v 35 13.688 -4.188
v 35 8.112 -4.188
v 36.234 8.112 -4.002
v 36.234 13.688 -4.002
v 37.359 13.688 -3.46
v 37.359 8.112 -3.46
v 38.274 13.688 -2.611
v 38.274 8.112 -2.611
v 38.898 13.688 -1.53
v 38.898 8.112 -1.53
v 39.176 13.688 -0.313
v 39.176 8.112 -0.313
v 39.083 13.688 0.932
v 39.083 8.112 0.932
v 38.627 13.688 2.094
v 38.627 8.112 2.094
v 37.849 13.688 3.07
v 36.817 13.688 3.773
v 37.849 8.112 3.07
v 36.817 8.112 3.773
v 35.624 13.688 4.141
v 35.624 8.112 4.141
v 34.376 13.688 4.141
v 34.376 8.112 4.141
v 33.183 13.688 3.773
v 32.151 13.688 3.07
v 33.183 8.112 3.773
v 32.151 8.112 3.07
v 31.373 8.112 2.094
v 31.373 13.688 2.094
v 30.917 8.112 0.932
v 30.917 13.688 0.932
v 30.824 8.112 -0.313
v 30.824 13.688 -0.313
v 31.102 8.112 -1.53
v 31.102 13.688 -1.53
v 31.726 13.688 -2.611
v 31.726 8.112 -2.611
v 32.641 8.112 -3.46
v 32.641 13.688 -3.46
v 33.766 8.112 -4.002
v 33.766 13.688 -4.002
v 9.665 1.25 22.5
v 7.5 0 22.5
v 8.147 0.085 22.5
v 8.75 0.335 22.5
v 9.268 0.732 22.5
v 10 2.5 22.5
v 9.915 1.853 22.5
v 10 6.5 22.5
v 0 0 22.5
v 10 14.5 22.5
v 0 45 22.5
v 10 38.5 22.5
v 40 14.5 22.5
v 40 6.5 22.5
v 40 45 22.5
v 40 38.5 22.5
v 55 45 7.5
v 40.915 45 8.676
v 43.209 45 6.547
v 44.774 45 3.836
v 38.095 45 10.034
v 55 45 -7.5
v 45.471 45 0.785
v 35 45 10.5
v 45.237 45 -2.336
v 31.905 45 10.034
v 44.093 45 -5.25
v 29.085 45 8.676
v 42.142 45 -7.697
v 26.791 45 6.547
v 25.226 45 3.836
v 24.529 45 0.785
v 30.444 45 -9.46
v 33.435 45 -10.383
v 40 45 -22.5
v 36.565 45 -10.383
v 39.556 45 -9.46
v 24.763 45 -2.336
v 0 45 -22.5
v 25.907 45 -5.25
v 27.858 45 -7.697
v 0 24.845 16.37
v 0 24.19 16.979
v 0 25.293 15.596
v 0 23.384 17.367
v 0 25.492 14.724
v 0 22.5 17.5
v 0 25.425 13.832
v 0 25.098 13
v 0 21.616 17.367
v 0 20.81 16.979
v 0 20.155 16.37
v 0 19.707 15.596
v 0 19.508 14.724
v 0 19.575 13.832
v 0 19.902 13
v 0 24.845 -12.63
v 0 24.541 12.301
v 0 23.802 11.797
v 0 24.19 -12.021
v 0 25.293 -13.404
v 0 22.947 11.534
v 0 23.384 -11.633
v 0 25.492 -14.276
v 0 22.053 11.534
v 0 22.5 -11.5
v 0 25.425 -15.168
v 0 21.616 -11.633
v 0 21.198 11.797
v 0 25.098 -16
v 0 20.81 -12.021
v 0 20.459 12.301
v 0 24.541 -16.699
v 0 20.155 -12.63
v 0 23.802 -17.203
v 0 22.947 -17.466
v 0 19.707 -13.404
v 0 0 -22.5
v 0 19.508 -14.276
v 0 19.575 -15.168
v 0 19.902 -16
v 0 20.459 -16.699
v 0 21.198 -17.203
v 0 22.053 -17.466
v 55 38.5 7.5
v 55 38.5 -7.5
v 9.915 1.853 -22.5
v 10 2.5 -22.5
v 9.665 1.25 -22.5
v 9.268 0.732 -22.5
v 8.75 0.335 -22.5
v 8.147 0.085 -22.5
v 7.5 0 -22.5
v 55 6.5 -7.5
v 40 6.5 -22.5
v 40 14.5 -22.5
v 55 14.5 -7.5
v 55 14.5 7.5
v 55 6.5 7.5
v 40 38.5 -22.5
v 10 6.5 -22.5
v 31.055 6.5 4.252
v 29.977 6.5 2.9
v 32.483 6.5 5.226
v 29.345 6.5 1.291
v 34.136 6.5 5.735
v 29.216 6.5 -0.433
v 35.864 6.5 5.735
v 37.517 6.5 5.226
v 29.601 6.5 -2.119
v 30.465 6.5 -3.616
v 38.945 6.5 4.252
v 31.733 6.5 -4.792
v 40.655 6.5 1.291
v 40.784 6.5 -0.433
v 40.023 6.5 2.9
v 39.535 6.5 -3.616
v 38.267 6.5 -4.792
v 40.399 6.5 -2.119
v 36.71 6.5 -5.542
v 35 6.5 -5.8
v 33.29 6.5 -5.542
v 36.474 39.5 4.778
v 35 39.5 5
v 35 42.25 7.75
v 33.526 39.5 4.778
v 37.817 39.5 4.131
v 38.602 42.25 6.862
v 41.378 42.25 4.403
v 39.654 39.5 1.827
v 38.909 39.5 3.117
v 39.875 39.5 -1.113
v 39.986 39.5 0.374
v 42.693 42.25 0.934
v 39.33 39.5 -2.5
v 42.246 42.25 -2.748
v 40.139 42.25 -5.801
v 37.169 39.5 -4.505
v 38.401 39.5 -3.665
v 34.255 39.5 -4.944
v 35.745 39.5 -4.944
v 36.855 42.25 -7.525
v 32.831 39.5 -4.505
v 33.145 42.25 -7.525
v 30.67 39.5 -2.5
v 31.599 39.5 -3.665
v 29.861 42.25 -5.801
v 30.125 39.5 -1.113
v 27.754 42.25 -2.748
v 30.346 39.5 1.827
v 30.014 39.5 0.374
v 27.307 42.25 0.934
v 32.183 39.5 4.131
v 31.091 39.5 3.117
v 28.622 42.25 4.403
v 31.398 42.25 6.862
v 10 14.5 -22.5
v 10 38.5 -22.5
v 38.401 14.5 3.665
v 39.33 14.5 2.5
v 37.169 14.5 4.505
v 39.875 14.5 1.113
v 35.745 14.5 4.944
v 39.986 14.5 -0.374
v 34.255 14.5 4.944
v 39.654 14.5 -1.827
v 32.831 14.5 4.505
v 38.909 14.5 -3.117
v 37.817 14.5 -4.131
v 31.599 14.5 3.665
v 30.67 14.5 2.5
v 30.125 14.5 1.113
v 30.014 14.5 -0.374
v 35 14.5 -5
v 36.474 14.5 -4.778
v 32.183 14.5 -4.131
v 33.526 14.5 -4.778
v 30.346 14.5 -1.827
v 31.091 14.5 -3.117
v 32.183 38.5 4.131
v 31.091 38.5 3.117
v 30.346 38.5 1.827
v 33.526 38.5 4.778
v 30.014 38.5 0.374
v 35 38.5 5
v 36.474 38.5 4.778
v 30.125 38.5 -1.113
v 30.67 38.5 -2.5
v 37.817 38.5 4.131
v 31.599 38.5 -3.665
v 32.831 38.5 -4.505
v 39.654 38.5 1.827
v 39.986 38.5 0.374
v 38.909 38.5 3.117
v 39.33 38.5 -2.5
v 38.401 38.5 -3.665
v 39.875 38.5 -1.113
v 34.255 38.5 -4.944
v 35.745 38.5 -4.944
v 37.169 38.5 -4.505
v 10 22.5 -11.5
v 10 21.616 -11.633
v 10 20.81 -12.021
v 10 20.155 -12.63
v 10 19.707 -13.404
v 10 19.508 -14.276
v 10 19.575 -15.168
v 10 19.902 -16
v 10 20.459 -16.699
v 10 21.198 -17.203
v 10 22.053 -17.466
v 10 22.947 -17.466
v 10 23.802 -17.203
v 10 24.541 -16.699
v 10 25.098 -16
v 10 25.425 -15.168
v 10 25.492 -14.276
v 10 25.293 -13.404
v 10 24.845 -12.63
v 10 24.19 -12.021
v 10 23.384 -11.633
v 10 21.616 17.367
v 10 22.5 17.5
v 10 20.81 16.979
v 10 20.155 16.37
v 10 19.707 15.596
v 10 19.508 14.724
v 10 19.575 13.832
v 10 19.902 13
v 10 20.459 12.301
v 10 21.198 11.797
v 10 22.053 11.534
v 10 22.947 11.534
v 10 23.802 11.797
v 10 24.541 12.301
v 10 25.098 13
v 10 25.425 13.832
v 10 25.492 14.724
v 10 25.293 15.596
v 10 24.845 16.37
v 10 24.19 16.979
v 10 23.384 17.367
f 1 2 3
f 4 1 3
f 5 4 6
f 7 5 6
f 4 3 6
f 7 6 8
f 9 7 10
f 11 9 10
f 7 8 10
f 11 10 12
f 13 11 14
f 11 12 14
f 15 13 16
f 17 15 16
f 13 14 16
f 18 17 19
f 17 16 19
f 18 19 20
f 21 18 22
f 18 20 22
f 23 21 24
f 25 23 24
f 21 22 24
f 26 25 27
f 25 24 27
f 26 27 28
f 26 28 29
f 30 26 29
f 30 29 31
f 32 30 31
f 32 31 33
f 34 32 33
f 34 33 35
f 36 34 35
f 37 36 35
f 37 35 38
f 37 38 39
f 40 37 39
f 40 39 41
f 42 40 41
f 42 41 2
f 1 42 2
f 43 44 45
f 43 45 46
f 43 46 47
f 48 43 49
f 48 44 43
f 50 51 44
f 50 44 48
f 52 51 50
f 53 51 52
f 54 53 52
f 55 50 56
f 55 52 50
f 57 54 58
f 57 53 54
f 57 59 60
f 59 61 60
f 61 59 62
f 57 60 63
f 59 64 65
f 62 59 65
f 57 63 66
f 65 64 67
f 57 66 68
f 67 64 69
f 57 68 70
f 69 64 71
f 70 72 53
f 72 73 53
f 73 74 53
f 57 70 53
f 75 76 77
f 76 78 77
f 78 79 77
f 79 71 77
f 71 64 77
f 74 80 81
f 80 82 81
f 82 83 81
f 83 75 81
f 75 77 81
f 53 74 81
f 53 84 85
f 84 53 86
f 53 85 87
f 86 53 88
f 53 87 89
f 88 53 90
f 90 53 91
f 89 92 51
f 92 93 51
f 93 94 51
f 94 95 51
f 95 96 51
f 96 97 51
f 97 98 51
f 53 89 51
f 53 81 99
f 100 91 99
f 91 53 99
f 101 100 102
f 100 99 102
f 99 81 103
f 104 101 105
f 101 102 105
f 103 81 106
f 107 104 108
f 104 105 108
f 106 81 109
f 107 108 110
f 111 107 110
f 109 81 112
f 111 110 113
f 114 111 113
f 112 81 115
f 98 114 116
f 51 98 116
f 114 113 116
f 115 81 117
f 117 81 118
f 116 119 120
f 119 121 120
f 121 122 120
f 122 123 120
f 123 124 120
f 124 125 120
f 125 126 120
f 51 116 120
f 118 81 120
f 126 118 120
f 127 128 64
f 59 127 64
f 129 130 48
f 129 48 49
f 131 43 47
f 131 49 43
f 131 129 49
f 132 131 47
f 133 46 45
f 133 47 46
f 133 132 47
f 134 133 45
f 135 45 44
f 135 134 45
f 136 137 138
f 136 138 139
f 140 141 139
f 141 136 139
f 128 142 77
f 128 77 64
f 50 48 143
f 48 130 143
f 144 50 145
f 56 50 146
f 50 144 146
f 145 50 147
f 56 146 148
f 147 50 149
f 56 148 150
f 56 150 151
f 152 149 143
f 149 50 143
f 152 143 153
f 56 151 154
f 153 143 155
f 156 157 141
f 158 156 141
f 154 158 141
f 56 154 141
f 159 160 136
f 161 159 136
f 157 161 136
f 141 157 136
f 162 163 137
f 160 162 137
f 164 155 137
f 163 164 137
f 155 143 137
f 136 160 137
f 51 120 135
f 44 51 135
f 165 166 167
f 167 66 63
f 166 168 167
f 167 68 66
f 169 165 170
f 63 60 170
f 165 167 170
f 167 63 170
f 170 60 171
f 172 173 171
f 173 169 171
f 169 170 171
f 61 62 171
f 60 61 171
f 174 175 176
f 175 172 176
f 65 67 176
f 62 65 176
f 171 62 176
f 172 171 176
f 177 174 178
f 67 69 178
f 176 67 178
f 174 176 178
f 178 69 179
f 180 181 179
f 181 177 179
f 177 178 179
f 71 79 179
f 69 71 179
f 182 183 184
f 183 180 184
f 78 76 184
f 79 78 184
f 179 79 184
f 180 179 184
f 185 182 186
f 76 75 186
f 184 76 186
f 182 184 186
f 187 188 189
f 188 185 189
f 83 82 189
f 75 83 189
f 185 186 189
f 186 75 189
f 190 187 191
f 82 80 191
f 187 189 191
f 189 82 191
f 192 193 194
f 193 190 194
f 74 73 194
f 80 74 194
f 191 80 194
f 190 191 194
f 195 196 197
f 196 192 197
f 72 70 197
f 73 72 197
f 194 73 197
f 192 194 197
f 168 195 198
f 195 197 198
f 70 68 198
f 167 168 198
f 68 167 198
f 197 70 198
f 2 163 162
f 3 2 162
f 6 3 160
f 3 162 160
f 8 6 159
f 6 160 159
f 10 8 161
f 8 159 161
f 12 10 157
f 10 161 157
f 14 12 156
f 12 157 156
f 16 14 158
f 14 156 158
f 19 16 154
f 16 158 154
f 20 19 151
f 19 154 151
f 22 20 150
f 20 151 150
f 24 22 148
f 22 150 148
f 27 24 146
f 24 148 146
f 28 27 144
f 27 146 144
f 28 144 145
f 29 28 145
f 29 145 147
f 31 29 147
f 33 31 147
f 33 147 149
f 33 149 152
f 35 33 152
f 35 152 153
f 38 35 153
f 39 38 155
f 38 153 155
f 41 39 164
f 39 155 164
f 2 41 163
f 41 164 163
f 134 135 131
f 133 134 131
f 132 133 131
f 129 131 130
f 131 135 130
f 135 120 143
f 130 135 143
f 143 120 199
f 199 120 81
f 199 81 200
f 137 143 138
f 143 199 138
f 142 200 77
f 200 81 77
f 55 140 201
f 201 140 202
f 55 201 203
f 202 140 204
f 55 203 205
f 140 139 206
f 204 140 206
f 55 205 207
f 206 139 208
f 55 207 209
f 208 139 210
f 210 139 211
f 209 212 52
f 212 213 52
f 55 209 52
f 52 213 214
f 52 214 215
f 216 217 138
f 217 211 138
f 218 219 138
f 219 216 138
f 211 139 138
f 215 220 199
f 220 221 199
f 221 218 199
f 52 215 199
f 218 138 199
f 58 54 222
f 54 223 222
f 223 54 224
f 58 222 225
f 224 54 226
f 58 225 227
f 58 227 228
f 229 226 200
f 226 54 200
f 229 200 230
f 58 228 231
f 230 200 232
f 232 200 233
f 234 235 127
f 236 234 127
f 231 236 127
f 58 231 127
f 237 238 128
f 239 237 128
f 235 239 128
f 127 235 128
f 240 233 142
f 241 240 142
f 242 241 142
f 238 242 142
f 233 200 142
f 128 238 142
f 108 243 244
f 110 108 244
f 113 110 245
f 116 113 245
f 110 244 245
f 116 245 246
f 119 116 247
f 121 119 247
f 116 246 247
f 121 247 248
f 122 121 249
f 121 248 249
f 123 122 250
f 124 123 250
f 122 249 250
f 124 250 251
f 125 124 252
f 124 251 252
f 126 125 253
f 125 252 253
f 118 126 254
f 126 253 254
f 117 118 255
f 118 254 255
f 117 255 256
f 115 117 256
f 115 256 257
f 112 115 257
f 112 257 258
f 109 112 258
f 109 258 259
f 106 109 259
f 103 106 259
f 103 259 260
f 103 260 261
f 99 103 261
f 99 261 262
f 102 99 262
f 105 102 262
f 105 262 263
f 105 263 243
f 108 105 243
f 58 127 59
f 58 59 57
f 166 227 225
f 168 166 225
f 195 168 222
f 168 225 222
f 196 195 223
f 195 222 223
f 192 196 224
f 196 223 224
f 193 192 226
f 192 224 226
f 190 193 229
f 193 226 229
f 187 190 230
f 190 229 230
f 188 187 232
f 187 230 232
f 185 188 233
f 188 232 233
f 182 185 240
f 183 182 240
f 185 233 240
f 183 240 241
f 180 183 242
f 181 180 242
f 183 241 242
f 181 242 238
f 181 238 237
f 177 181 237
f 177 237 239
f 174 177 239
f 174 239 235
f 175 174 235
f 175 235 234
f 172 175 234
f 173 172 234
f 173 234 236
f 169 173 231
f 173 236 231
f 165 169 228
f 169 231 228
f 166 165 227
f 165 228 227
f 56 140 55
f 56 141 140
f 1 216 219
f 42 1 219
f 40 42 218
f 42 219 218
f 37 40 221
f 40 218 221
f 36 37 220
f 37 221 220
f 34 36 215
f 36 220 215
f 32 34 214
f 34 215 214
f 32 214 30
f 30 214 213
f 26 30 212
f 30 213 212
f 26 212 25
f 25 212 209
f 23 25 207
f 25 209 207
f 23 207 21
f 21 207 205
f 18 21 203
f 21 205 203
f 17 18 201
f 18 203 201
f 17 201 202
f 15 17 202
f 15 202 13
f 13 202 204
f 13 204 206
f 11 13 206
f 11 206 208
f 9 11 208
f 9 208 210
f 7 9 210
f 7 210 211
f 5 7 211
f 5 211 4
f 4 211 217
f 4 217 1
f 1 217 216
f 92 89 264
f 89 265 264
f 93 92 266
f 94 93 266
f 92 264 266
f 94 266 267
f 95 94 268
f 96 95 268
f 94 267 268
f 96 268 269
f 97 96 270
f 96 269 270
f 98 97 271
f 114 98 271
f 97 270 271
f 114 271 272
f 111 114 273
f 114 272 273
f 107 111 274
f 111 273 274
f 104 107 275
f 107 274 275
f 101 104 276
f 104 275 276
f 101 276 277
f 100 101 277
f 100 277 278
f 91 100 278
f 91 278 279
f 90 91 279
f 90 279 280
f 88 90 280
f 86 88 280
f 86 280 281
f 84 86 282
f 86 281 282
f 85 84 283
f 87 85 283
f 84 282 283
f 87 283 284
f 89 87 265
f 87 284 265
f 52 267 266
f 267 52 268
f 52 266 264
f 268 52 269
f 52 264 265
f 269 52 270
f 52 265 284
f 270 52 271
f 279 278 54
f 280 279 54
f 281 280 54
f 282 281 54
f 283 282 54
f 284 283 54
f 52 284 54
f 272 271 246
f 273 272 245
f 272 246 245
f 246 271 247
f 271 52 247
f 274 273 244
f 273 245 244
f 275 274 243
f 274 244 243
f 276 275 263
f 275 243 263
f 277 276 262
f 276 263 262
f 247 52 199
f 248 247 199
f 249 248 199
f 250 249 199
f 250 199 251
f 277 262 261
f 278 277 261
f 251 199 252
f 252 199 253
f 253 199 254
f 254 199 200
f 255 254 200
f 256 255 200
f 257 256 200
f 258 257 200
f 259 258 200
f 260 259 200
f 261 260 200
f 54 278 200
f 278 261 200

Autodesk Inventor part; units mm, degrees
sketch "Sketch_6" plane through (0, 0, 0) normal (0, 0, 1) x (1, 0, 0)
  line L0 (0, 45) -> (0, 0)
  line L1 (0, 0) -> (7.5, 0)
  arc A0 (7.5, 0) -> (10, 2.5) centre (7.5, 2.5) ccw
  line L2 (10, 2.5) -> (10, 6.5)
  line L3 (10, 6.5) -> (55, 6.5)
  line L4 (55, 6.5) -> (55, 14.5)
  line L5 (55, 14.5) -> (10, 14.5)
  line L6 (10, 14.5) -> (10, 38.5)
  line L7 (10, 38.5) -> (55, 38.5)
  line L8 (55, 38.5) -> (55, 45)
  line L9 (55, 45) -> (0, 45)
extrude "Extrusion1" add sketch "Sketch_6" along normal mid plane 45
sketch "Sketch_7" plane through (0, 0, 0) normal (0, 1, 0) x (-1, 0, 0)
  line L0 (-40, 22.5) -> (-110, 22.5)
  line L1 (-110, 22.5) -> (-110, -22.5)
  line L2 (-110, -22.5) -> (-40, -22.5)
  line L3 (-40, -22.5) -> (-55, -7.5)
  line L4 (-55, -7.5) -> (-55, 7.5)
  line L5 (-55, 7.5) -> (-40, 22.5)
extrude "Extrusion2" cut sketch "Sketch_7" along normal blind 45
sketch "Sketch_8" plane through (35, 0, 0) normal (1, 0, 0) x (0, 0, -1)
  line L0 (0, 6.5) -> (0, 14.5)
  line L1 (0, 14.5) -> (5, 14.5)
  line L2 (5, 14.5) -> (4.188, 13.688)
  line L3 (4.188, 13.688) -> (4.188, 8.112)
  line L4 (4.188, 8.112) -> (5.8, 6.5)
  line L5 (5.8, 6.5) -> (0, 6.5)
  line L6 (0, 6.5) -> (0, 14.5)
revolve "Revolution1" cut sketch "Sketch_8" angle 360 about axis through (35, 6.5, 0) along (0, -1, 0)
thread "Thread1" size "M10x1.5" class "6H" standard "ISO Metric profile" full length
sketch "Sketch4" plane through (0, 45, 22.5) normal (0, 1, 0) x (1, 0, 0)
  point P0 (35, 22.5)
hole "Hole1" at (35, 45, 0) direction (0, -1, 0) diameter 10 depth 6.5 countersink diameter 21 countersink angle 90
sketch "Sketch5" plane through (0, 0, 22.5) normal (-1, 0, 0) x (0, 0, 1)
  point P0 (-37, 22.5)
hole "Hole2" at (0, 22.5, -14.5) direction (1, 0, 0) diameter 6 depth 10
sketch "Sketch6" plane through (0, 0, 22.5) normal (-1, 0, 0) x (0, 0, 1)
  point P0 (-8, 22.5)
hole "Hole3" at (0, 22.5, 14.5) direction (1, 0, 0) diameter 6 depth 10
ref_plane "bracket_to_screw_XY" through (35, 45, 0) normal (0, 1, 0) x (1, 0, 0)
ref_plane "bracket_to_screw_YZ" through (35, 45, 0) normal (1, 0, 0) x (0, 0, -1)
ref_plane "bracket_to_screw_ZX" through (35, 45, 0) normal (0, 0, -1) x (0, 1, 0)
ref_plane "screw11_XY" through (10, 22.5, 14.5) normal (1, 0, 0) x (0, 0, -1)
ref_plane "screw11_YZ" through (10, 22.5, 14.5) normal (0, 0, -1) x (0, 1, 0)
ref_plane "screw11_ZX" through (10, 22.5, 14.5) normal (0, 1, 0) x (1, 0, 0)
ref_plane "screw12_XY" through (10, 22.5, -14.5) normal (1, 0, 0) x (0, 0, -1)
ref_plane "screw12_YZ" through (10, 22.5, -14.5) normal (0, 0, -1) x (0, 1, 0)
ref_plane "screw12_ZX" through (10, 22.5, -14.5) normal (0, 1, 0) x (1, 0, 0)
ref_plane "screw1_1_XY" through (-27.6, 22.5, 14.5) normal (-1, 0, 0) x (0, 0, -1)
ref_plane "screw1_1_YZ" through (-27.6, 22.5, 14.5) normal (0, 0, -1) x (0, -1, 0)
ref_plane "screw1_1_ZX" through (-27.6, 22.5, 14.5) normal (0, -1, 0) x (-1, 0, 0)
ref_plane "screw1_2_XY" through (-27.6, 22.5, -14.5) normal (-1, 0, 0) x (0, 0, -1)
ref_plane "screw1_2_YZ" through (-27.6, 22.5, -14.5) normal (0, 0, -1) x (0, -1, 0)
ref_plane "screw1_2_ZX" through (-27.6, 22.5, -14.5) normal (0, -1, 0) x (-1, 0, 0)
ref_plane "screw2_XY" through (10, 22.5, 0) normal (1, 0, 0) x (0, 0, -1)
ref_plane "screw2_YZ" through (10, 22.5, 0) normal (0, 0, -1) x (0, 1, 0)
ref_plane "screw2_ZX" through (10, 22.5, 0) normal (0, 1, 0) x (1, 0, 0)
ref_plane "screw22_XY" through (2.2, 22.5, 0) normal (1, 0, 0) x (0, 0, -1)
ref_plane "screw22_YZ" through (2.2, 22.5, 0) normal (0, 0, -1) x (0, 1, 0)
ref_plane "screw22_ZX" through (2.2, 22.5, 0) normal (0, 1, 0) x (1, 0, 0)
ref_plane "screw3_XY" through (0, 22.5, 14.5) normal (1, 0, 0) x (0, 0, -1)
ref_plane "screw3_YZ" through (0, 22.5, 14.5) normal (0, 0, -1) x (0, 1, 0)
ref_plane "screw3_ZX" through (0, 22.5, 14.5) normal (0, 1, 0) x (1, 0, 0)
ref_plane "screw3_1_XY" through (0, 22.5, -14.5) normal (1, 0, 0) x (0, 0, -1)
ref_plane "screw3_1_YZ" through (0, 22.5, -14.5) normal (0, 0, -1) x (0, 1, 0)
ref_plane "screw3_1_ZX" through (0, 22.5, -14.5) normal (0, 1, 0) x (1, 0, 0)
properties part number "HBLTBBN45-SET_b"
